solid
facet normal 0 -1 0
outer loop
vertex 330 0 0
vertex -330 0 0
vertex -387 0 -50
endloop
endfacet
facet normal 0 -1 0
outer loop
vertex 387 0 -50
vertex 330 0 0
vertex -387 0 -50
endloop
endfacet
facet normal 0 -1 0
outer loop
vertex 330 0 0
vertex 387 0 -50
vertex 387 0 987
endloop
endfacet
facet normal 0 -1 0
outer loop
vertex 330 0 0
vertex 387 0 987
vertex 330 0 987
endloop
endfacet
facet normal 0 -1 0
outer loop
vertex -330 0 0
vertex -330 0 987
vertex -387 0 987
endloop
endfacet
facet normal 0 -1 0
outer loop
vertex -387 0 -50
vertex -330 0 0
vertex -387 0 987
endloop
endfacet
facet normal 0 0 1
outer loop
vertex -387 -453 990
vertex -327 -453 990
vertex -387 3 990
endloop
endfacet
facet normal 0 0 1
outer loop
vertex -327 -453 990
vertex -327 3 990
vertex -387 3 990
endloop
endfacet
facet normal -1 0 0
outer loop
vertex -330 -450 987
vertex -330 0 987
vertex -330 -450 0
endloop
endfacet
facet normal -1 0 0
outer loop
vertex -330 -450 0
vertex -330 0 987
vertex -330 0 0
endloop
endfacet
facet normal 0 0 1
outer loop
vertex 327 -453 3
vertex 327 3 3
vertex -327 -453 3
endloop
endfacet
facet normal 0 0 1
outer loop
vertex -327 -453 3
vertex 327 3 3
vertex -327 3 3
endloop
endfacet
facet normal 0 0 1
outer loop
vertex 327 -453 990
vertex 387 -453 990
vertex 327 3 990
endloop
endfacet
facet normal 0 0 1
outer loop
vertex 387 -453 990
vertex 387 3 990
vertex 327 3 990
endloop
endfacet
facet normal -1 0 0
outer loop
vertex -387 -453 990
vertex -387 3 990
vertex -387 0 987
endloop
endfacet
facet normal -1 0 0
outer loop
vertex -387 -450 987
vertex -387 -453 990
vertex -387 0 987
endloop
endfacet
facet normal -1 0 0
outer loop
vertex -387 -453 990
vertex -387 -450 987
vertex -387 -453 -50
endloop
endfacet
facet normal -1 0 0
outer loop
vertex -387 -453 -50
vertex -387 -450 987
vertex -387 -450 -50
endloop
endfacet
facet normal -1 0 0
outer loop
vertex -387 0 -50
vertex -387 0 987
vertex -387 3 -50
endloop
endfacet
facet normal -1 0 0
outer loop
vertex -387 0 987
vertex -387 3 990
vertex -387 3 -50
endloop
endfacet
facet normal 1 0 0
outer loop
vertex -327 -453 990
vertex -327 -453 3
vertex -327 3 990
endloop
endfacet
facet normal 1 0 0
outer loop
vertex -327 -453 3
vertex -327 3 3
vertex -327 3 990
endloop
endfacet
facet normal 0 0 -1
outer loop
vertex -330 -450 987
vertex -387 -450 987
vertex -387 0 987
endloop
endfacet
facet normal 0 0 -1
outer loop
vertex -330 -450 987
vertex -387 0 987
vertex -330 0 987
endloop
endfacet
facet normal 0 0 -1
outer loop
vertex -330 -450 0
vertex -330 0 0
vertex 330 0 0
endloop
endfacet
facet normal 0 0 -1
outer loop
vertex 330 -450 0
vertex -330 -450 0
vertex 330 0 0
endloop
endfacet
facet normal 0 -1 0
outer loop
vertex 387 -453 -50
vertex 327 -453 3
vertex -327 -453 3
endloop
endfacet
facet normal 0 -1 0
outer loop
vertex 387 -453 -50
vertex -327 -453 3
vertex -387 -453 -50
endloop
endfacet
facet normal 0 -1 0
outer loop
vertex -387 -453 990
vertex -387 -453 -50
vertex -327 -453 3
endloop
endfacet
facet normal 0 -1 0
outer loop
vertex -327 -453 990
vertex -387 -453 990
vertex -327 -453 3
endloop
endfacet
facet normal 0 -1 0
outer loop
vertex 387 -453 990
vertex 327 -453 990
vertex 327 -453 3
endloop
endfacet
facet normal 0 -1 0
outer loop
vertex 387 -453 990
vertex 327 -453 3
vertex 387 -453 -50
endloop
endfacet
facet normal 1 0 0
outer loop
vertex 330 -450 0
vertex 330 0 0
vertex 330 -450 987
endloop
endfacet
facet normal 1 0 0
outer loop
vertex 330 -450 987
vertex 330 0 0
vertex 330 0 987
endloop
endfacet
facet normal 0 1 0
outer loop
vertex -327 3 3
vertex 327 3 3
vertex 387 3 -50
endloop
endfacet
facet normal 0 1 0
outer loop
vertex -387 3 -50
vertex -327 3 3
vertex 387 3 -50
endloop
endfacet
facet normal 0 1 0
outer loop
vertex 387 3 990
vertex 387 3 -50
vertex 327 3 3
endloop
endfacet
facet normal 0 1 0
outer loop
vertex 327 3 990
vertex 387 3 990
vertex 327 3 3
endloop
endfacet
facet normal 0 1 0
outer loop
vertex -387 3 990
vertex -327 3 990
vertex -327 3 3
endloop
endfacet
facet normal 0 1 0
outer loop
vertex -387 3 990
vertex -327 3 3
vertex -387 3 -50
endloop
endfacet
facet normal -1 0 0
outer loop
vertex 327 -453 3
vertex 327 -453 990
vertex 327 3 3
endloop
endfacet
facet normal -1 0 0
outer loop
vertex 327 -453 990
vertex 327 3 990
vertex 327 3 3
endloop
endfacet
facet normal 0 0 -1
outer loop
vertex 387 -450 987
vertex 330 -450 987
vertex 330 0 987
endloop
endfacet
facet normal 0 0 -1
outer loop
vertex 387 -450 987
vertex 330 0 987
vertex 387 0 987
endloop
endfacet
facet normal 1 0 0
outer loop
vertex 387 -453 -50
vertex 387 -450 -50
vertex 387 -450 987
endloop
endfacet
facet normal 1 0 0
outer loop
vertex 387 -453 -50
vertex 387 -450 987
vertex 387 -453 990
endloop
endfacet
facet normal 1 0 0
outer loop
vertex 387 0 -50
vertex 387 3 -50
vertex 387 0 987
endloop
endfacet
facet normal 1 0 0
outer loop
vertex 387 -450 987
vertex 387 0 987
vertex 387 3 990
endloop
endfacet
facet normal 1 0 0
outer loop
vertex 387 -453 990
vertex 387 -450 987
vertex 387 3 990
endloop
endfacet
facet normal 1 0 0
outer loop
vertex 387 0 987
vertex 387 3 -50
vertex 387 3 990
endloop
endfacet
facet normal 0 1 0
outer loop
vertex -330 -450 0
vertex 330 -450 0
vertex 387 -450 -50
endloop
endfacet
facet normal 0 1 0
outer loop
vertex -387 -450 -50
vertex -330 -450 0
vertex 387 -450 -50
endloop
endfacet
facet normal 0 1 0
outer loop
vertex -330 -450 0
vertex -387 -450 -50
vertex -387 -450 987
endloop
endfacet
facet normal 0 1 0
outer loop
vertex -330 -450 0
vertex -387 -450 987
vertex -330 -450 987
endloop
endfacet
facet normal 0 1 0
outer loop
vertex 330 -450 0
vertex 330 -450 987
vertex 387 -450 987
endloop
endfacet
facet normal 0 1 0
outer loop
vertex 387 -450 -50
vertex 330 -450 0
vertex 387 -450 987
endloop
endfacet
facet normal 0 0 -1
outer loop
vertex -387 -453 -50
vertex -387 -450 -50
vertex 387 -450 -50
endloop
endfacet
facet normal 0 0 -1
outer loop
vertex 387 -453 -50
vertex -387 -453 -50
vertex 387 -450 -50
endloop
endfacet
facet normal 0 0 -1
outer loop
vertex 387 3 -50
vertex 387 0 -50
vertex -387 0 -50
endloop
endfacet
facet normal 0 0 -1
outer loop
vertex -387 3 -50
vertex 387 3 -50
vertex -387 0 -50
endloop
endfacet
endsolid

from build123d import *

# Parameters (mm, degrees)
F1_DEPTH = 450
F2_T     = -3
F3_W     = 60
F3_H     = 450
F4_DEPTH = 3
F6_DEPTH = 3
F8_DEPTH = 3


with BuildPart() as f1:
    # F0 (on Front) → F1 (new body)
    with BuildSketch(Plane.XZ):
        Polygon((330, 990), (-330, 990), (-330, 0), (0, 0), (330, 0), align=None)
    extrude(amount=F1_DEPTH)

    # F2
    f2_openings = [f1.faces().sort_by_distance(p)[0] for p in [
        (0, -450, 495),
        (0, -225, 990),
        (0, 0, 495),
    ]]
    offset(amount=F2_T, openings=f2_openings)

    # F3 (on face) → F4 (join)
    with BuildSketch(Plane.XY.offset(990)):
        with Locations((-357, -225)):
            Rectangle(F3_W, F3_H)
        with Locations((357, -225)):
            Rectangle(F3_W, F3_H)
    extrude(amount=-F4_DEPTH)

    # F5 (on face) → F6 (join)
    with BuildSketch(Plane(origin=(0, 0, 0), x_dir=(-1, 0, 0), z_dir=(0, 1, 0))):
        Polygon((387, 990), (327, 990), (327, 3), (-327, 3), (-327, 990), (-387, 990), (-387, -50), (22.530401, -50), (387, -50), align=None)
    extrude(amount=F6_DEPTH)

    # F7 (on face) → F8 (join)
    with BuildSketch(Plane.XZ.offset(450)):
        Polygon((387, -50), (387, 990), (327, 990), (327, 3), (-327, 3), (-327, 990), (-387, 990), (-387, -50), (35.580868, -50), align=None)
    extrude(amount=F8_DEPTH)


solid = f1.part
